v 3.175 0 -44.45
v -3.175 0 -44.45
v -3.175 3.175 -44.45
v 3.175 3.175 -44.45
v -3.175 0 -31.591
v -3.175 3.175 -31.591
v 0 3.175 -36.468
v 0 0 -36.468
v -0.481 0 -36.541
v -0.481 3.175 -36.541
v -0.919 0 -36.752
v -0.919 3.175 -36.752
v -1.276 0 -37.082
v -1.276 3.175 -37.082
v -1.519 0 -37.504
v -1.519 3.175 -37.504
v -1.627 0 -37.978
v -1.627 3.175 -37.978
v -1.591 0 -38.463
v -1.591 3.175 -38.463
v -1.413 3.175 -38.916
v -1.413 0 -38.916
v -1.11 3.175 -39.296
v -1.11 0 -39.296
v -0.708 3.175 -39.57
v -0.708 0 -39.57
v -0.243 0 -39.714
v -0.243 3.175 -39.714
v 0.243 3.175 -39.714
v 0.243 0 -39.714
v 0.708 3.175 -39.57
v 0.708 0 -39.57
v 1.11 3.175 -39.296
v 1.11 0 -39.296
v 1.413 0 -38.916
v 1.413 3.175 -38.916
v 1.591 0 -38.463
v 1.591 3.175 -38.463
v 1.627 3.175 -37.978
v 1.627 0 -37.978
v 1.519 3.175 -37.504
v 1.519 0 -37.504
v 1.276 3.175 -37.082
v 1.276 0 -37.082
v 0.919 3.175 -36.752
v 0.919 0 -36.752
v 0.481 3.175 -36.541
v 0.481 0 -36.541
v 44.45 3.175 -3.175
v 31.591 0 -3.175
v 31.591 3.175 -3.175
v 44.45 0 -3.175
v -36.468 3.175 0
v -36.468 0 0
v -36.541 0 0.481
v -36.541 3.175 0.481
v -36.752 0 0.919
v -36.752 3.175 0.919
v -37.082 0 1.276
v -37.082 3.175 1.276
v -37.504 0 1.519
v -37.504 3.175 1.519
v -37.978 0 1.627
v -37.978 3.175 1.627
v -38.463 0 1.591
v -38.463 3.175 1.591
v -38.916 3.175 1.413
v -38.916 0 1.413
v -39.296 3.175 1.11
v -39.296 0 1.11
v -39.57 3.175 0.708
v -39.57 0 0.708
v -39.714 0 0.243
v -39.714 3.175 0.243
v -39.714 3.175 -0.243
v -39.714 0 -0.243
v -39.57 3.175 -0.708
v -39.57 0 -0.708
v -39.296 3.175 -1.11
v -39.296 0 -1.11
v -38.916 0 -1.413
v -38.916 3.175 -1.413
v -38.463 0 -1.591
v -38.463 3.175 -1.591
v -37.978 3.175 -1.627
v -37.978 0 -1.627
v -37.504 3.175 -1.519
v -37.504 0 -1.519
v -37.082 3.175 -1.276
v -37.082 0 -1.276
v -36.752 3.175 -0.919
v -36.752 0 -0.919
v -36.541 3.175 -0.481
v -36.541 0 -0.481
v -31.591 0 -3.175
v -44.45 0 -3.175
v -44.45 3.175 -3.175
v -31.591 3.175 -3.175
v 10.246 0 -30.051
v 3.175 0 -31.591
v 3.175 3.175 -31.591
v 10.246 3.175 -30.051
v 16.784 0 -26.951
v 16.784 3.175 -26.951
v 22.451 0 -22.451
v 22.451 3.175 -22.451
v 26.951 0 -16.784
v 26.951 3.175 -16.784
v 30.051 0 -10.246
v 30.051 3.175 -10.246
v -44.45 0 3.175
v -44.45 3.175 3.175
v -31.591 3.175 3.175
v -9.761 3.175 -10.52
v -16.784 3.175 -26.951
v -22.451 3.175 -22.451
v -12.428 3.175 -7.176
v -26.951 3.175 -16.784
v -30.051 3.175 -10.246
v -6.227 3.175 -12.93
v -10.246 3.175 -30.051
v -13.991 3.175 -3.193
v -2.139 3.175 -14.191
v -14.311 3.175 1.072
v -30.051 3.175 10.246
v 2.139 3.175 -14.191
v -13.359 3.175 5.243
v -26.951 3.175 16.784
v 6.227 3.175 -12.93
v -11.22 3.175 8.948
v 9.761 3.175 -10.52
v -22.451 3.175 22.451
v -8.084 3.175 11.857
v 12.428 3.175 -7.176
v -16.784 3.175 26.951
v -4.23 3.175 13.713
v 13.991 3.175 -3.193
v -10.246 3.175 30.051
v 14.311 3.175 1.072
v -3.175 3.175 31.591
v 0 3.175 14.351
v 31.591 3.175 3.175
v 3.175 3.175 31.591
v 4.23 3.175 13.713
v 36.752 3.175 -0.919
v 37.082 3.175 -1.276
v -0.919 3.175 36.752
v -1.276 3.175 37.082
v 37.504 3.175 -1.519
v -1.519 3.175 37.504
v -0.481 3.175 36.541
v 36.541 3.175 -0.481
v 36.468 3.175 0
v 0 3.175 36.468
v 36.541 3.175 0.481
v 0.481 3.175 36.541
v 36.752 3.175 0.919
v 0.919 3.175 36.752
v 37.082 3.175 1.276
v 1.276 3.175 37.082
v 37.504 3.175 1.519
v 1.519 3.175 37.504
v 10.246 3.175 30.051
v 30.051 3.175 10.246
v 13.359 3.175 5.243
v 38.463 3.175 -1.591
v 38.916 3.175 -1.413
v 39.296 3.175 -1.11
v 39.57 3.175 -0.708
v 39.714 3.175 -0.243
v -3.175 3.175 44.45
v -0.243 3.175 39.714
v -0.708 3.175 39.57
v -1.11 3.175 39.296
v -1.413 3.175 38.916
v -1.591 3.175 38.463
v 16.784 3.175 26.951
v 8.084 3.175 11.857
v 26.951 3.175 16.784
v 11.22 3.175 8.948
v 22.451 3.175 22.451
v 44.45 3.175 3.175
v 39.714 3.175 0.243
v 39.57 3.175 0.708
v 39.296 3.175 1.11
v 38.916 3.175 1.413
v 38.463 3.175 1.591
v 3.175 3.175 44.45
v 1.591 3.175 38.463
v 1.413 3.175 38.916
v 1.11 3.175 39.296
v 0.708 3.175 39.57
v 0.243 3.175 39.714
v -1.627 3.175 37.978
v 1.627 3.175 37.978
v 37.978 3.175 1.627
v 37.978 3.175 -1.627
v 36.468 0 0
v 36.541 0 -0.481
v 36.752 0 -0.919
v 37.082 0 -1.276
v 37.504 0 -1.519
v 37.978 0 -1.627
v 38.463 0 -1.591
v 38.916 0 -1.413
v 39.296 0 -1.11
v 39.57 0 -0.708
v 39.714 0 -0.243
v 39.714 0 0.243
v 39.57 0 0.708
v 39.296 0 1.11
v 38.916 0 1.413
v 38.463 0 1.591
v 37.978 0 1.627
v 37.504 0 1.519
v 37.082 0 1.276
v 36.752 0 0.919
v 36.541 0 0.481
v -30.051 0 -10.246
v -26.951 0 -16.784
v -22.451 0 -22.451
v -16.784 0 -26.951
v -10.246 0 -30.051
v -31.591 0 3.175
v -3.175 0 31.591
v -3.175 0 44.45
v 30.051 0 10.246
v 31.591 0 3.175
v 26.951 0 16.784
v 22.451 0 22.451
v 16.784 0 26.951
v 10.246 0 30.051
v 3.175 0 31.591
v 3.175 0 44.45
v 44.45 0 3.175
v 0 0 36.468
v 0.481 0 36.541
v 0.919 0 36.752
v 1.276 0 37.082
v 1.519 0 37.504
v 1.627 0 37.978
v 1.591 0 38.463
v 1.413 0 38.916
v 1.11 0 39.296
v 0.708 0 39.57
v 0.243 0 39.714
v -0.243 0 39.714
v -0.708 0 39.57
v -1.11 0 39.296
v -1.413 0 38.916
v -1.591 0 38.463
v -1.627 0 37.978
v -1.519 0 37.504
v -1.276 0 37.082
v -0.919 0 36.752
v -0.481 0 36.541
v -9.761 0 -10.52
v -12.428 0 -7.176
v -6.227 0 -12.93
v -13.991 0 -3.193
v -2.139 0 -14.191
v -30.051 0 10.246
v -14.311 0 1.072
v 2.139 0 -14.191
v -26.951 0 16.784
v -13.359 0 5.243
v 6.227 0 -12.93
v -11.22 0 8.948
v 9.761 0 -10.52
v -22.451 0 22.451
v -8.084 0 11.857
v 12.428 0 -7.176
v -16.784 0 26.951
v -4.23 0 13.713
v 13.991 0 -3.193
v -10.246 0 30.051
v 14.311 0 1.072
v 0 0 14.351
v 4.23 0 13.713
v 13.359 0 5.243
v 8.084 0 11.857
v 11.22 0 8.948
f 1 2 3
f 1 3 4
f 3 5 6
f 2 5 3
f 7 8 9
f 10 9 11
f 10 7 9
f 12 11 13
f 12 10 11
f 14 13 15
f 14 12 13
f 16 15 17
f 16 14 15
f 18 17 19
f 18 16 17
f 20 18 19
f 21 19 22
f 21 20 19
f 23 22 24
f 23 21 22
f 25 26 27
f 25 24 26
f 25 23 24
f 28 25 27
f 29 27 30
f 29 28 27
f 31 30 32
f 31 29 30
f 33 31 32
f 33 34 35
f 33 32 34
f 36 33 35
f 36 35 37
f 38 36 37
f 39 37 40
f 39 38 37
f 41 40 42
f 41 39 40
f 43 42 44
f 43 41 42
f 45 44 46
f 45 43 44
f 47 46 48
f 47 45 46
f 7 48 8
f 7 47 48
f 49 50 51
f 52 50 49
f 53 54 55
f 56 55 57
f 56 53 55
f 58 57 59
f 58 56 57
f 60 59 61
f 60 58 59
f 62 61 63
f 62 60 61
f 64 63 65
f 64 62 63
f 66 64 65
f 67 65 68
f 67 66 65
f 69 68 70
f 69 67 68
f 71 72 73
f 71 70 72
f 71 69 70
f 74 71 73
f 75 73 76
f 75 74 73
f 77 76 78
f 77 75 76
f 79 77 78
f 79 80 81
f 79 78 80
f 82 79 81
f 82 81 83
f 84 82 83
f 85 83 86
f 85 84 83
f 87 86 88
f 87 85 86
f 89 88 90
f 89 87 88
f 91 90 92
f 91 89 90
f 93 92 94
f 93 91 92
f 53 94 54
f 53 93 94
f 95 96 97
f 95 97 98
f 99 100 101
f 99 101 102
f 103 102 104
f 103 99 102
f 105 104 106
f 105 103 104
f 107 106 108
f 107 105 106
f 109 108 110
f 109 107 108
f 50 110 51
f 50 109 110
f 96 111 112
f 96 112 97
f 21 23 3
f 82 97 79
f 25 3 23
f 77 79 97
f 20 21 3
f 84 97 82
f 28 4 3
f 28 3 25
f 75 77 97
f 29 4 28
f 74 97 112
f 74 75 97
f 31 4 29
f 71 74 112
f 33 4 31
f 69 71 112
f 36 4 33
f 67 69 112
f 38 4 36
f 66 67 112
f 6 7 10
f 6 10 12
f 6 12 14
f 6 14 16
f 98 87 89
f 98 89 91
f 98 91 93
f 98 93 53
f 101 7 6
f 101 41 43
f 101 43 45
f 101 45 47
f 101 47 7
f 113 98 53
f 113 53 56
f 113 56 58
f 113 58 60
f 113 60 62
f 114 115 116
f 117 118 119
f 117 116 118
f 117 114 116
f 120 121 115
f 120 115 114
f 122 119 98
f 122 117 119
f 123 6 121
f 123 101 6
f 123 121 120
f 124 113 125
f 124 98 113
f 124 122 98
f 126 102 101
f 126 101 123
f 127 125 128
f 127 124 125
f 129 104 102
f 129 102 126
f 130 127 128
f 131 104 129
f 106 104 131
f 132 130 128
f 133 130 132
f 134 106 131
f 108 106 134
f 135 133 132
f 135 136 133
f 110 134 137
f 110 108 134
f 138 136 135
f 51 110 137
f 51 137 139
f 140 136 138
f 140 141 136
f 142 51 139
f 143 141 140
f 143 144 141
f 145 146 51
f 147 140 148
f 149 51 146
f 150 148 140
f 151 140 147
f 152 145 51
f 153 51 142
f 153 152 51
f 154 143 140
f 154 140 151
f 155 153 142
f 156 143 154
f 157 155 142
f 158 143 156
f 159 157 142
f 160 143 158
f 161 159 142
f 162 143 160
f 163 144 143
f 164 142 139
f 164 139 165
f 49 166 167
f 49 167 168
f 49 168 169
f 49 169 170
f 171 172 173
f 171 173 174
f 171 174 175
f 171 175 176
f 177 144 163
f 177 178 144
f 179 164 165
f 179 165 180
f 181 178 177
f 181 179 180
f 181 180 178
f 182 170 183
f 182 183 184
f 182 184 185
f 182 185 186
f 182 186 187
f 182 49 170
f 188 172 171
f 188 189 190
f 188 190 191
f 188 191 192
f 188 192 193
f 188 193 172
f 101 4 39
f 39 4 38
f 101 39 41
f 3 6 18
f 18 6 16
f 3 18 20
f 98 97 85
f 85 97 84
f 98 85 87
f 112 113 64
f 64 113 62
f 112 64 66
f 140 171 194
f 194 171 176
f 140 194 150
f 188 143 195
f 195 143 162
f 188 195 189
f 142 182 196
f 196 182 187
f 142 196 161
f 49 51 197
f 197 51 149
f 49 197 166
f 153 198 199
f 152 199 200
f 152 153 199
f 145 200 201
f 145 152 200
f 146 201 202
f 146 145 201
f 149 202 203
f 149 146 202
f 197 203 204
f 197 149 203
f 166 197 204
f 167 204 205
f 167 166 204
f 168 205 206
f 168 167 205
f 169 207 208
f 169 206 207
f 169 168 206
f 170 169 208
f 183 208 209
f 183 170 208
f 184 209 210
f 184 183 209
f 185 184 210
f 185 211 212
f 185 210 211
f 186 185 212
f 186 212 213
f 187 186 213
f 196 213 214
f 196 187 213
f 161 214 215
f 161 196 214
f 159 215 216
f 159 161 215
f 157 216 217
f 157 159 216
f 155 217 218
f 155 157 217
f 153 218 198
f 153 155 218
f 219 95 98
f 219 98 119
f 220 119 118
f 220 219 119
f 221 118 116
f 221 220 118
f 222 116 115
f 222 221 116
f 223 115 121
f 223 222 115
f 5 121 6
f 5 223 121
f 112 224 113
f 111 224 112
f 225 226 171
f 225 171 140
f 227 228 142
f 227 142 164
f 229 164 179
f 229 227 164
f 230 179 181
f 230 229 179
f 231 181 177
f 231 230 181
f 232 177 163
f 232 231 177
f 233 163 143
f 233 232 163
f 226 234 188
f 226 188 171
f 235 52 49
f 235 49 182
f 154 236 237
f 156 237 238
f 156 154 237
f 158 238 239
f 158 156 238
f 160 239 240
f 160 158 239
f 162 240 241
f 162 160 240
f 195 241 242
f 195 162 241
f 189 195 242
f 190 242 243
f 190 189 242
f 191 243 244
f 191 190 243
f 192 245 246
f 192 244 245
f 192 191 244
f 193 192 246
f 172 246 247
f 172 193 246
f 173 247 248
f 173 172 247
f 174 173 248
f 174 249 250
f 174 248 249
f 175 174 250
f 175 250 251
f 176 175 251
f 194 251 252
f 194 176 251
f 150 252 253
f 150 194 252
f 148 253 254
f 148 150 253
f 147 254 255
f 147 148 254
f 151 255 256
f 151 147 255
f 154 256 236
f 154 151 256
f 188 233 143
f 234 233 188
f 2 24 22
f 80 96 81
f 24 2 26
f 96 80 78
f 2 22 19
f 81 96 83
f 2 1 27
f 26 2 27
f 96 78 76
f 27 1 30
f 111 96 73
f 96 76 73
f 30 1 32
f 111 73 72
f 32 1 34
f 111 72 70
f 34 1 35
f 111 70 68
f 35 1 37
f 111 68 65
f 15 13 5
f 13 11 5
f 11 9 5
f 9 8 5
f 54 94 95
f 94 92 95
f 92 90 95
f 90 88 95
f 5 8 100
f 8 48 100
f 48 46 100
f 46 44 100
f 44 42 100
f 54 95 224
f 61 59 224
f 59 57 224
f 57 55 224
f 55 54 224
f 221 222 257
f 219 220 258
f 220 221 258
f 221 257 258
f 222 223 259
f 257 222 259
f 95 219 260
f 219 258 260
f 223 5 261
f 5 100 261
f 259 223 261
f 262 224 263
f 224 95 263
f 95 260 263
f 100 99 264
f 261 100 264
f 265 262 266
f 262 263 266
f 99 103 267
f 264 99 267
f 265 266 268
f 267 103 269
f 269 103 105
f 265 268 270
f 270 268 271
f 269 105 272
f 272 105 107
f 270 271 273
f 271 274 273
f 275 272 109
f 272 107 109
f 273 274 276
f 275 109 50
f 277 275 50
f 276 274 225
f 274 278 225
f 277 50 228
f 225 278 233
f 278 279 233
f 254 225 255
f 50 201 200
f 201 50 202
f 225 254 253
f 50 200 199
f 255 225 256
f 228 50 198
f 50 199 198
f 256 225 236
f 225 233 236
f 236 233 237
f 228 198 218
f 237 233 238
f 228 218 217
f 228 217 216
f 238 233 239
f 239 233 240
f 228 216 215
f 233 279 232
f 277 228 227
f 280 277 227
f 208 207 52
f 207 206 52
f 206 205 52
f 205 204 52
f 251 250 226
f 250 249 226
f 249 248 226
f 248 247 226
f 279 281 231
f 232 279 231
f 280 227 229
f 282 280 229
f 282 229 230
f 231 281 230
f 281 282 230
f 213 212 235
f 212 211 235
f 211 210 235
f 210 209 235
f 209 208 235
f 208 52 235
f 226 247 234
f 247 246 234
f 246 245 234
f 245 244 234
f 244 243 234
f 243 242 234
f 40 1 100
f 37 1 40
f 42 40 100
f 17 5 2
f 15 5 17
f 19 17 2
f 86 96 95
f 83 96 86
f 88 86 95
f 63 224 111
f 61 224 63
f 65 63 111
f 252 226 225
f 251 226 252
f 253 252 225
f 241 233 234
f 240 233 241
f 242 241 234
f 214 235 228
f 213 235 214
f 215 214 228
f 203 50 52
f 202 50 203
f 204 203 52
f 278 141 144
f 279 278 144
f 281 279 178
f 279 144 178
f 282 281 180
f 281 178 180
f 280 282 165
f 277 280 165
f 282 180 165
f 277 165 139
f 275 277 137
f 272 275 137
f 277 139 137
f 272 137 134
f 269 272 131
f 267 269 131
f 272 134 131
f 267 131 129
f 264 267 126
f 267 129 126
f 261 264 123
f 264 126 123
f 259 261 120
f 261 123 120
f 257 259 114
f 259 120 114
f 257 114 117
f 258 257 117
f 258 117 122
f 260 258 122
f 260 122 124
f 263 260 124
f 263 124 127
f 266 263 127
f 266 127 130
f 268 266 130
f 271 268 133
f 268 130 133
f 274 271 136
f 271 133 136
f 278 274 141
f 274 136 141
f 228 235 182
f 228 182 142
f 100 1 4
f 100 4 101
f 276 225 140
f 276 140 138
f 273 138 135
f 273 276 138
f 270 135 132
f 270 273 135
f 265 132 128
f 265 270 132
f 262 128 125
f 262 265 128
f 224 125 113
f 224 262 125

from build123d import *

# Parameters (mm, degrees)
SKETCH1_R           = 46.99
BOSS_EXTRUDE1_DEPTH = 3.175
SKETCH2_R           = 14.351
CUT_EXTRUDE1_DEPTH  = 3.175
CUT_EXTRUDE2_START  = -5.08
SKETCH5_R           = 46.99
CUT_EXTRUDE2_DEPTH  = 5.08
CIRPATTERN1_COUNT   = 4


with BuildPart() as part:
    # Sketch1 → Boss-Extrude1 (new body)
    with BuildSketch(Plane(origin=(0, 0, 0), x_dir=(1, 0, 0), z_dir=(0, 1, 0))):
        with Locations(Location((0, 0, 0), (0, 0, 270))):
            Circle(SKETCH1_R)
    extrude(amount=BOSS_EXTRUDE1_DEPTH)

    # Sketch2 → Cut-Extrude1 (cut)
    with BuildSketch(Plane(origin=(0, 3.175, 0), x_dir=(1, 0, 0), z_dir=(0, 1, 0))):
        with Locations(Location((0, 0, 0), (0, 0, 270))):
            Circle(SKETCH2_R)
    extrude(amount=-CUT_EXTRUDE1_DEPTH, mode=Mode.SUBTRACT)

    # Sketch5 → Cut-Extrude2 (cut)
    with BuildSketch(Plane(origin=(0, 3.175, 0), x_dir=(1, 0, 0), z_dir=(0, 1, 0)).offset(CUT_EXTRUDE2_START)):
        Circle(SKETCH5_R)
        with BuildLine():
            Line((31.590851128, 3.175), (44.45, 3.175))
            Line((44.45, 3.175), (44.45, -3.175))
            Line((44.45, -3.175), (31.590851128, -3.175))
            ThreePointArc((31.590851128, -3.175), (22.450640303, -22.450640303), (3.175, -31.590851128))
            Line((3.175, -31.590851128), (3.175, -44.45))
            Line((3.175, -44.45), (-3.175, -44.45))
            Line((-3.175, -44.45), (-3.175, -31.590851128))
            ThreePointArc((-3.175, -31.590851128), (-22.450640303, -22.450640303), (-31.590851128, -3.175))
            Line((-31.590851128, -3.175), (-44.45, -3.175))
            Line((-44.45, -3.175), (-44.45, 3.175))
            Line((-44.45, 3.175), (-31.590851128, 3.175))
            ThreePointArc((-31.590851128, 3.175), (-22.450640303, 22.450640303), (-3.175, 31.590851128))
            Line((-3.175, 31.590851128), (-3.175, 44.45))
            Line((-3.175, 44.45), (3.175, 44.45))
            Line((3.175, 44.45), (3.175, 31.590851128))
            ThreePointArc((3.175, 31.590851128), (22.450640303, 22.450640303), (31.590851128, 3.175))
        make_face(mode=Mode.SUBTRACT)
    extrude(amount=CUT_EXTRUDE2_DEPTH, mode=Mode.SUBTRACT)

    # Sketch6 → #4 Clearance Hole1 (revolve, cut)
    with BuildSketch(Plane(origin=(0, 3.175, -38.1), x_dir=(0, 0, 1), z_dir=(1, 0, 0))):
        Polygon((0, 0), (0, 11.140574487), (1.63195, 10.16), (1.63195, 0), align=None)
    f_4_clearance_hole1 = revolve(axis=Axis((0, 9.525, -38.1), (0, -1, 0)), mode=Mode.SUBTRACT)

    # CirPattern1: #4 Clearance Hole1 ×4 about axis
    cirpattern1_axis = Axis((0, 0, 0), (0, 1, 0))
    for i in range(1, CIRPATTERN1_COUNT):
        add(f_4_clearance_hole1.rotate(cirpattern1_axis, i * 360 / CIRPATTERN1_COUNT), mode=Mode.SUBTRACT)


solid = part.part
